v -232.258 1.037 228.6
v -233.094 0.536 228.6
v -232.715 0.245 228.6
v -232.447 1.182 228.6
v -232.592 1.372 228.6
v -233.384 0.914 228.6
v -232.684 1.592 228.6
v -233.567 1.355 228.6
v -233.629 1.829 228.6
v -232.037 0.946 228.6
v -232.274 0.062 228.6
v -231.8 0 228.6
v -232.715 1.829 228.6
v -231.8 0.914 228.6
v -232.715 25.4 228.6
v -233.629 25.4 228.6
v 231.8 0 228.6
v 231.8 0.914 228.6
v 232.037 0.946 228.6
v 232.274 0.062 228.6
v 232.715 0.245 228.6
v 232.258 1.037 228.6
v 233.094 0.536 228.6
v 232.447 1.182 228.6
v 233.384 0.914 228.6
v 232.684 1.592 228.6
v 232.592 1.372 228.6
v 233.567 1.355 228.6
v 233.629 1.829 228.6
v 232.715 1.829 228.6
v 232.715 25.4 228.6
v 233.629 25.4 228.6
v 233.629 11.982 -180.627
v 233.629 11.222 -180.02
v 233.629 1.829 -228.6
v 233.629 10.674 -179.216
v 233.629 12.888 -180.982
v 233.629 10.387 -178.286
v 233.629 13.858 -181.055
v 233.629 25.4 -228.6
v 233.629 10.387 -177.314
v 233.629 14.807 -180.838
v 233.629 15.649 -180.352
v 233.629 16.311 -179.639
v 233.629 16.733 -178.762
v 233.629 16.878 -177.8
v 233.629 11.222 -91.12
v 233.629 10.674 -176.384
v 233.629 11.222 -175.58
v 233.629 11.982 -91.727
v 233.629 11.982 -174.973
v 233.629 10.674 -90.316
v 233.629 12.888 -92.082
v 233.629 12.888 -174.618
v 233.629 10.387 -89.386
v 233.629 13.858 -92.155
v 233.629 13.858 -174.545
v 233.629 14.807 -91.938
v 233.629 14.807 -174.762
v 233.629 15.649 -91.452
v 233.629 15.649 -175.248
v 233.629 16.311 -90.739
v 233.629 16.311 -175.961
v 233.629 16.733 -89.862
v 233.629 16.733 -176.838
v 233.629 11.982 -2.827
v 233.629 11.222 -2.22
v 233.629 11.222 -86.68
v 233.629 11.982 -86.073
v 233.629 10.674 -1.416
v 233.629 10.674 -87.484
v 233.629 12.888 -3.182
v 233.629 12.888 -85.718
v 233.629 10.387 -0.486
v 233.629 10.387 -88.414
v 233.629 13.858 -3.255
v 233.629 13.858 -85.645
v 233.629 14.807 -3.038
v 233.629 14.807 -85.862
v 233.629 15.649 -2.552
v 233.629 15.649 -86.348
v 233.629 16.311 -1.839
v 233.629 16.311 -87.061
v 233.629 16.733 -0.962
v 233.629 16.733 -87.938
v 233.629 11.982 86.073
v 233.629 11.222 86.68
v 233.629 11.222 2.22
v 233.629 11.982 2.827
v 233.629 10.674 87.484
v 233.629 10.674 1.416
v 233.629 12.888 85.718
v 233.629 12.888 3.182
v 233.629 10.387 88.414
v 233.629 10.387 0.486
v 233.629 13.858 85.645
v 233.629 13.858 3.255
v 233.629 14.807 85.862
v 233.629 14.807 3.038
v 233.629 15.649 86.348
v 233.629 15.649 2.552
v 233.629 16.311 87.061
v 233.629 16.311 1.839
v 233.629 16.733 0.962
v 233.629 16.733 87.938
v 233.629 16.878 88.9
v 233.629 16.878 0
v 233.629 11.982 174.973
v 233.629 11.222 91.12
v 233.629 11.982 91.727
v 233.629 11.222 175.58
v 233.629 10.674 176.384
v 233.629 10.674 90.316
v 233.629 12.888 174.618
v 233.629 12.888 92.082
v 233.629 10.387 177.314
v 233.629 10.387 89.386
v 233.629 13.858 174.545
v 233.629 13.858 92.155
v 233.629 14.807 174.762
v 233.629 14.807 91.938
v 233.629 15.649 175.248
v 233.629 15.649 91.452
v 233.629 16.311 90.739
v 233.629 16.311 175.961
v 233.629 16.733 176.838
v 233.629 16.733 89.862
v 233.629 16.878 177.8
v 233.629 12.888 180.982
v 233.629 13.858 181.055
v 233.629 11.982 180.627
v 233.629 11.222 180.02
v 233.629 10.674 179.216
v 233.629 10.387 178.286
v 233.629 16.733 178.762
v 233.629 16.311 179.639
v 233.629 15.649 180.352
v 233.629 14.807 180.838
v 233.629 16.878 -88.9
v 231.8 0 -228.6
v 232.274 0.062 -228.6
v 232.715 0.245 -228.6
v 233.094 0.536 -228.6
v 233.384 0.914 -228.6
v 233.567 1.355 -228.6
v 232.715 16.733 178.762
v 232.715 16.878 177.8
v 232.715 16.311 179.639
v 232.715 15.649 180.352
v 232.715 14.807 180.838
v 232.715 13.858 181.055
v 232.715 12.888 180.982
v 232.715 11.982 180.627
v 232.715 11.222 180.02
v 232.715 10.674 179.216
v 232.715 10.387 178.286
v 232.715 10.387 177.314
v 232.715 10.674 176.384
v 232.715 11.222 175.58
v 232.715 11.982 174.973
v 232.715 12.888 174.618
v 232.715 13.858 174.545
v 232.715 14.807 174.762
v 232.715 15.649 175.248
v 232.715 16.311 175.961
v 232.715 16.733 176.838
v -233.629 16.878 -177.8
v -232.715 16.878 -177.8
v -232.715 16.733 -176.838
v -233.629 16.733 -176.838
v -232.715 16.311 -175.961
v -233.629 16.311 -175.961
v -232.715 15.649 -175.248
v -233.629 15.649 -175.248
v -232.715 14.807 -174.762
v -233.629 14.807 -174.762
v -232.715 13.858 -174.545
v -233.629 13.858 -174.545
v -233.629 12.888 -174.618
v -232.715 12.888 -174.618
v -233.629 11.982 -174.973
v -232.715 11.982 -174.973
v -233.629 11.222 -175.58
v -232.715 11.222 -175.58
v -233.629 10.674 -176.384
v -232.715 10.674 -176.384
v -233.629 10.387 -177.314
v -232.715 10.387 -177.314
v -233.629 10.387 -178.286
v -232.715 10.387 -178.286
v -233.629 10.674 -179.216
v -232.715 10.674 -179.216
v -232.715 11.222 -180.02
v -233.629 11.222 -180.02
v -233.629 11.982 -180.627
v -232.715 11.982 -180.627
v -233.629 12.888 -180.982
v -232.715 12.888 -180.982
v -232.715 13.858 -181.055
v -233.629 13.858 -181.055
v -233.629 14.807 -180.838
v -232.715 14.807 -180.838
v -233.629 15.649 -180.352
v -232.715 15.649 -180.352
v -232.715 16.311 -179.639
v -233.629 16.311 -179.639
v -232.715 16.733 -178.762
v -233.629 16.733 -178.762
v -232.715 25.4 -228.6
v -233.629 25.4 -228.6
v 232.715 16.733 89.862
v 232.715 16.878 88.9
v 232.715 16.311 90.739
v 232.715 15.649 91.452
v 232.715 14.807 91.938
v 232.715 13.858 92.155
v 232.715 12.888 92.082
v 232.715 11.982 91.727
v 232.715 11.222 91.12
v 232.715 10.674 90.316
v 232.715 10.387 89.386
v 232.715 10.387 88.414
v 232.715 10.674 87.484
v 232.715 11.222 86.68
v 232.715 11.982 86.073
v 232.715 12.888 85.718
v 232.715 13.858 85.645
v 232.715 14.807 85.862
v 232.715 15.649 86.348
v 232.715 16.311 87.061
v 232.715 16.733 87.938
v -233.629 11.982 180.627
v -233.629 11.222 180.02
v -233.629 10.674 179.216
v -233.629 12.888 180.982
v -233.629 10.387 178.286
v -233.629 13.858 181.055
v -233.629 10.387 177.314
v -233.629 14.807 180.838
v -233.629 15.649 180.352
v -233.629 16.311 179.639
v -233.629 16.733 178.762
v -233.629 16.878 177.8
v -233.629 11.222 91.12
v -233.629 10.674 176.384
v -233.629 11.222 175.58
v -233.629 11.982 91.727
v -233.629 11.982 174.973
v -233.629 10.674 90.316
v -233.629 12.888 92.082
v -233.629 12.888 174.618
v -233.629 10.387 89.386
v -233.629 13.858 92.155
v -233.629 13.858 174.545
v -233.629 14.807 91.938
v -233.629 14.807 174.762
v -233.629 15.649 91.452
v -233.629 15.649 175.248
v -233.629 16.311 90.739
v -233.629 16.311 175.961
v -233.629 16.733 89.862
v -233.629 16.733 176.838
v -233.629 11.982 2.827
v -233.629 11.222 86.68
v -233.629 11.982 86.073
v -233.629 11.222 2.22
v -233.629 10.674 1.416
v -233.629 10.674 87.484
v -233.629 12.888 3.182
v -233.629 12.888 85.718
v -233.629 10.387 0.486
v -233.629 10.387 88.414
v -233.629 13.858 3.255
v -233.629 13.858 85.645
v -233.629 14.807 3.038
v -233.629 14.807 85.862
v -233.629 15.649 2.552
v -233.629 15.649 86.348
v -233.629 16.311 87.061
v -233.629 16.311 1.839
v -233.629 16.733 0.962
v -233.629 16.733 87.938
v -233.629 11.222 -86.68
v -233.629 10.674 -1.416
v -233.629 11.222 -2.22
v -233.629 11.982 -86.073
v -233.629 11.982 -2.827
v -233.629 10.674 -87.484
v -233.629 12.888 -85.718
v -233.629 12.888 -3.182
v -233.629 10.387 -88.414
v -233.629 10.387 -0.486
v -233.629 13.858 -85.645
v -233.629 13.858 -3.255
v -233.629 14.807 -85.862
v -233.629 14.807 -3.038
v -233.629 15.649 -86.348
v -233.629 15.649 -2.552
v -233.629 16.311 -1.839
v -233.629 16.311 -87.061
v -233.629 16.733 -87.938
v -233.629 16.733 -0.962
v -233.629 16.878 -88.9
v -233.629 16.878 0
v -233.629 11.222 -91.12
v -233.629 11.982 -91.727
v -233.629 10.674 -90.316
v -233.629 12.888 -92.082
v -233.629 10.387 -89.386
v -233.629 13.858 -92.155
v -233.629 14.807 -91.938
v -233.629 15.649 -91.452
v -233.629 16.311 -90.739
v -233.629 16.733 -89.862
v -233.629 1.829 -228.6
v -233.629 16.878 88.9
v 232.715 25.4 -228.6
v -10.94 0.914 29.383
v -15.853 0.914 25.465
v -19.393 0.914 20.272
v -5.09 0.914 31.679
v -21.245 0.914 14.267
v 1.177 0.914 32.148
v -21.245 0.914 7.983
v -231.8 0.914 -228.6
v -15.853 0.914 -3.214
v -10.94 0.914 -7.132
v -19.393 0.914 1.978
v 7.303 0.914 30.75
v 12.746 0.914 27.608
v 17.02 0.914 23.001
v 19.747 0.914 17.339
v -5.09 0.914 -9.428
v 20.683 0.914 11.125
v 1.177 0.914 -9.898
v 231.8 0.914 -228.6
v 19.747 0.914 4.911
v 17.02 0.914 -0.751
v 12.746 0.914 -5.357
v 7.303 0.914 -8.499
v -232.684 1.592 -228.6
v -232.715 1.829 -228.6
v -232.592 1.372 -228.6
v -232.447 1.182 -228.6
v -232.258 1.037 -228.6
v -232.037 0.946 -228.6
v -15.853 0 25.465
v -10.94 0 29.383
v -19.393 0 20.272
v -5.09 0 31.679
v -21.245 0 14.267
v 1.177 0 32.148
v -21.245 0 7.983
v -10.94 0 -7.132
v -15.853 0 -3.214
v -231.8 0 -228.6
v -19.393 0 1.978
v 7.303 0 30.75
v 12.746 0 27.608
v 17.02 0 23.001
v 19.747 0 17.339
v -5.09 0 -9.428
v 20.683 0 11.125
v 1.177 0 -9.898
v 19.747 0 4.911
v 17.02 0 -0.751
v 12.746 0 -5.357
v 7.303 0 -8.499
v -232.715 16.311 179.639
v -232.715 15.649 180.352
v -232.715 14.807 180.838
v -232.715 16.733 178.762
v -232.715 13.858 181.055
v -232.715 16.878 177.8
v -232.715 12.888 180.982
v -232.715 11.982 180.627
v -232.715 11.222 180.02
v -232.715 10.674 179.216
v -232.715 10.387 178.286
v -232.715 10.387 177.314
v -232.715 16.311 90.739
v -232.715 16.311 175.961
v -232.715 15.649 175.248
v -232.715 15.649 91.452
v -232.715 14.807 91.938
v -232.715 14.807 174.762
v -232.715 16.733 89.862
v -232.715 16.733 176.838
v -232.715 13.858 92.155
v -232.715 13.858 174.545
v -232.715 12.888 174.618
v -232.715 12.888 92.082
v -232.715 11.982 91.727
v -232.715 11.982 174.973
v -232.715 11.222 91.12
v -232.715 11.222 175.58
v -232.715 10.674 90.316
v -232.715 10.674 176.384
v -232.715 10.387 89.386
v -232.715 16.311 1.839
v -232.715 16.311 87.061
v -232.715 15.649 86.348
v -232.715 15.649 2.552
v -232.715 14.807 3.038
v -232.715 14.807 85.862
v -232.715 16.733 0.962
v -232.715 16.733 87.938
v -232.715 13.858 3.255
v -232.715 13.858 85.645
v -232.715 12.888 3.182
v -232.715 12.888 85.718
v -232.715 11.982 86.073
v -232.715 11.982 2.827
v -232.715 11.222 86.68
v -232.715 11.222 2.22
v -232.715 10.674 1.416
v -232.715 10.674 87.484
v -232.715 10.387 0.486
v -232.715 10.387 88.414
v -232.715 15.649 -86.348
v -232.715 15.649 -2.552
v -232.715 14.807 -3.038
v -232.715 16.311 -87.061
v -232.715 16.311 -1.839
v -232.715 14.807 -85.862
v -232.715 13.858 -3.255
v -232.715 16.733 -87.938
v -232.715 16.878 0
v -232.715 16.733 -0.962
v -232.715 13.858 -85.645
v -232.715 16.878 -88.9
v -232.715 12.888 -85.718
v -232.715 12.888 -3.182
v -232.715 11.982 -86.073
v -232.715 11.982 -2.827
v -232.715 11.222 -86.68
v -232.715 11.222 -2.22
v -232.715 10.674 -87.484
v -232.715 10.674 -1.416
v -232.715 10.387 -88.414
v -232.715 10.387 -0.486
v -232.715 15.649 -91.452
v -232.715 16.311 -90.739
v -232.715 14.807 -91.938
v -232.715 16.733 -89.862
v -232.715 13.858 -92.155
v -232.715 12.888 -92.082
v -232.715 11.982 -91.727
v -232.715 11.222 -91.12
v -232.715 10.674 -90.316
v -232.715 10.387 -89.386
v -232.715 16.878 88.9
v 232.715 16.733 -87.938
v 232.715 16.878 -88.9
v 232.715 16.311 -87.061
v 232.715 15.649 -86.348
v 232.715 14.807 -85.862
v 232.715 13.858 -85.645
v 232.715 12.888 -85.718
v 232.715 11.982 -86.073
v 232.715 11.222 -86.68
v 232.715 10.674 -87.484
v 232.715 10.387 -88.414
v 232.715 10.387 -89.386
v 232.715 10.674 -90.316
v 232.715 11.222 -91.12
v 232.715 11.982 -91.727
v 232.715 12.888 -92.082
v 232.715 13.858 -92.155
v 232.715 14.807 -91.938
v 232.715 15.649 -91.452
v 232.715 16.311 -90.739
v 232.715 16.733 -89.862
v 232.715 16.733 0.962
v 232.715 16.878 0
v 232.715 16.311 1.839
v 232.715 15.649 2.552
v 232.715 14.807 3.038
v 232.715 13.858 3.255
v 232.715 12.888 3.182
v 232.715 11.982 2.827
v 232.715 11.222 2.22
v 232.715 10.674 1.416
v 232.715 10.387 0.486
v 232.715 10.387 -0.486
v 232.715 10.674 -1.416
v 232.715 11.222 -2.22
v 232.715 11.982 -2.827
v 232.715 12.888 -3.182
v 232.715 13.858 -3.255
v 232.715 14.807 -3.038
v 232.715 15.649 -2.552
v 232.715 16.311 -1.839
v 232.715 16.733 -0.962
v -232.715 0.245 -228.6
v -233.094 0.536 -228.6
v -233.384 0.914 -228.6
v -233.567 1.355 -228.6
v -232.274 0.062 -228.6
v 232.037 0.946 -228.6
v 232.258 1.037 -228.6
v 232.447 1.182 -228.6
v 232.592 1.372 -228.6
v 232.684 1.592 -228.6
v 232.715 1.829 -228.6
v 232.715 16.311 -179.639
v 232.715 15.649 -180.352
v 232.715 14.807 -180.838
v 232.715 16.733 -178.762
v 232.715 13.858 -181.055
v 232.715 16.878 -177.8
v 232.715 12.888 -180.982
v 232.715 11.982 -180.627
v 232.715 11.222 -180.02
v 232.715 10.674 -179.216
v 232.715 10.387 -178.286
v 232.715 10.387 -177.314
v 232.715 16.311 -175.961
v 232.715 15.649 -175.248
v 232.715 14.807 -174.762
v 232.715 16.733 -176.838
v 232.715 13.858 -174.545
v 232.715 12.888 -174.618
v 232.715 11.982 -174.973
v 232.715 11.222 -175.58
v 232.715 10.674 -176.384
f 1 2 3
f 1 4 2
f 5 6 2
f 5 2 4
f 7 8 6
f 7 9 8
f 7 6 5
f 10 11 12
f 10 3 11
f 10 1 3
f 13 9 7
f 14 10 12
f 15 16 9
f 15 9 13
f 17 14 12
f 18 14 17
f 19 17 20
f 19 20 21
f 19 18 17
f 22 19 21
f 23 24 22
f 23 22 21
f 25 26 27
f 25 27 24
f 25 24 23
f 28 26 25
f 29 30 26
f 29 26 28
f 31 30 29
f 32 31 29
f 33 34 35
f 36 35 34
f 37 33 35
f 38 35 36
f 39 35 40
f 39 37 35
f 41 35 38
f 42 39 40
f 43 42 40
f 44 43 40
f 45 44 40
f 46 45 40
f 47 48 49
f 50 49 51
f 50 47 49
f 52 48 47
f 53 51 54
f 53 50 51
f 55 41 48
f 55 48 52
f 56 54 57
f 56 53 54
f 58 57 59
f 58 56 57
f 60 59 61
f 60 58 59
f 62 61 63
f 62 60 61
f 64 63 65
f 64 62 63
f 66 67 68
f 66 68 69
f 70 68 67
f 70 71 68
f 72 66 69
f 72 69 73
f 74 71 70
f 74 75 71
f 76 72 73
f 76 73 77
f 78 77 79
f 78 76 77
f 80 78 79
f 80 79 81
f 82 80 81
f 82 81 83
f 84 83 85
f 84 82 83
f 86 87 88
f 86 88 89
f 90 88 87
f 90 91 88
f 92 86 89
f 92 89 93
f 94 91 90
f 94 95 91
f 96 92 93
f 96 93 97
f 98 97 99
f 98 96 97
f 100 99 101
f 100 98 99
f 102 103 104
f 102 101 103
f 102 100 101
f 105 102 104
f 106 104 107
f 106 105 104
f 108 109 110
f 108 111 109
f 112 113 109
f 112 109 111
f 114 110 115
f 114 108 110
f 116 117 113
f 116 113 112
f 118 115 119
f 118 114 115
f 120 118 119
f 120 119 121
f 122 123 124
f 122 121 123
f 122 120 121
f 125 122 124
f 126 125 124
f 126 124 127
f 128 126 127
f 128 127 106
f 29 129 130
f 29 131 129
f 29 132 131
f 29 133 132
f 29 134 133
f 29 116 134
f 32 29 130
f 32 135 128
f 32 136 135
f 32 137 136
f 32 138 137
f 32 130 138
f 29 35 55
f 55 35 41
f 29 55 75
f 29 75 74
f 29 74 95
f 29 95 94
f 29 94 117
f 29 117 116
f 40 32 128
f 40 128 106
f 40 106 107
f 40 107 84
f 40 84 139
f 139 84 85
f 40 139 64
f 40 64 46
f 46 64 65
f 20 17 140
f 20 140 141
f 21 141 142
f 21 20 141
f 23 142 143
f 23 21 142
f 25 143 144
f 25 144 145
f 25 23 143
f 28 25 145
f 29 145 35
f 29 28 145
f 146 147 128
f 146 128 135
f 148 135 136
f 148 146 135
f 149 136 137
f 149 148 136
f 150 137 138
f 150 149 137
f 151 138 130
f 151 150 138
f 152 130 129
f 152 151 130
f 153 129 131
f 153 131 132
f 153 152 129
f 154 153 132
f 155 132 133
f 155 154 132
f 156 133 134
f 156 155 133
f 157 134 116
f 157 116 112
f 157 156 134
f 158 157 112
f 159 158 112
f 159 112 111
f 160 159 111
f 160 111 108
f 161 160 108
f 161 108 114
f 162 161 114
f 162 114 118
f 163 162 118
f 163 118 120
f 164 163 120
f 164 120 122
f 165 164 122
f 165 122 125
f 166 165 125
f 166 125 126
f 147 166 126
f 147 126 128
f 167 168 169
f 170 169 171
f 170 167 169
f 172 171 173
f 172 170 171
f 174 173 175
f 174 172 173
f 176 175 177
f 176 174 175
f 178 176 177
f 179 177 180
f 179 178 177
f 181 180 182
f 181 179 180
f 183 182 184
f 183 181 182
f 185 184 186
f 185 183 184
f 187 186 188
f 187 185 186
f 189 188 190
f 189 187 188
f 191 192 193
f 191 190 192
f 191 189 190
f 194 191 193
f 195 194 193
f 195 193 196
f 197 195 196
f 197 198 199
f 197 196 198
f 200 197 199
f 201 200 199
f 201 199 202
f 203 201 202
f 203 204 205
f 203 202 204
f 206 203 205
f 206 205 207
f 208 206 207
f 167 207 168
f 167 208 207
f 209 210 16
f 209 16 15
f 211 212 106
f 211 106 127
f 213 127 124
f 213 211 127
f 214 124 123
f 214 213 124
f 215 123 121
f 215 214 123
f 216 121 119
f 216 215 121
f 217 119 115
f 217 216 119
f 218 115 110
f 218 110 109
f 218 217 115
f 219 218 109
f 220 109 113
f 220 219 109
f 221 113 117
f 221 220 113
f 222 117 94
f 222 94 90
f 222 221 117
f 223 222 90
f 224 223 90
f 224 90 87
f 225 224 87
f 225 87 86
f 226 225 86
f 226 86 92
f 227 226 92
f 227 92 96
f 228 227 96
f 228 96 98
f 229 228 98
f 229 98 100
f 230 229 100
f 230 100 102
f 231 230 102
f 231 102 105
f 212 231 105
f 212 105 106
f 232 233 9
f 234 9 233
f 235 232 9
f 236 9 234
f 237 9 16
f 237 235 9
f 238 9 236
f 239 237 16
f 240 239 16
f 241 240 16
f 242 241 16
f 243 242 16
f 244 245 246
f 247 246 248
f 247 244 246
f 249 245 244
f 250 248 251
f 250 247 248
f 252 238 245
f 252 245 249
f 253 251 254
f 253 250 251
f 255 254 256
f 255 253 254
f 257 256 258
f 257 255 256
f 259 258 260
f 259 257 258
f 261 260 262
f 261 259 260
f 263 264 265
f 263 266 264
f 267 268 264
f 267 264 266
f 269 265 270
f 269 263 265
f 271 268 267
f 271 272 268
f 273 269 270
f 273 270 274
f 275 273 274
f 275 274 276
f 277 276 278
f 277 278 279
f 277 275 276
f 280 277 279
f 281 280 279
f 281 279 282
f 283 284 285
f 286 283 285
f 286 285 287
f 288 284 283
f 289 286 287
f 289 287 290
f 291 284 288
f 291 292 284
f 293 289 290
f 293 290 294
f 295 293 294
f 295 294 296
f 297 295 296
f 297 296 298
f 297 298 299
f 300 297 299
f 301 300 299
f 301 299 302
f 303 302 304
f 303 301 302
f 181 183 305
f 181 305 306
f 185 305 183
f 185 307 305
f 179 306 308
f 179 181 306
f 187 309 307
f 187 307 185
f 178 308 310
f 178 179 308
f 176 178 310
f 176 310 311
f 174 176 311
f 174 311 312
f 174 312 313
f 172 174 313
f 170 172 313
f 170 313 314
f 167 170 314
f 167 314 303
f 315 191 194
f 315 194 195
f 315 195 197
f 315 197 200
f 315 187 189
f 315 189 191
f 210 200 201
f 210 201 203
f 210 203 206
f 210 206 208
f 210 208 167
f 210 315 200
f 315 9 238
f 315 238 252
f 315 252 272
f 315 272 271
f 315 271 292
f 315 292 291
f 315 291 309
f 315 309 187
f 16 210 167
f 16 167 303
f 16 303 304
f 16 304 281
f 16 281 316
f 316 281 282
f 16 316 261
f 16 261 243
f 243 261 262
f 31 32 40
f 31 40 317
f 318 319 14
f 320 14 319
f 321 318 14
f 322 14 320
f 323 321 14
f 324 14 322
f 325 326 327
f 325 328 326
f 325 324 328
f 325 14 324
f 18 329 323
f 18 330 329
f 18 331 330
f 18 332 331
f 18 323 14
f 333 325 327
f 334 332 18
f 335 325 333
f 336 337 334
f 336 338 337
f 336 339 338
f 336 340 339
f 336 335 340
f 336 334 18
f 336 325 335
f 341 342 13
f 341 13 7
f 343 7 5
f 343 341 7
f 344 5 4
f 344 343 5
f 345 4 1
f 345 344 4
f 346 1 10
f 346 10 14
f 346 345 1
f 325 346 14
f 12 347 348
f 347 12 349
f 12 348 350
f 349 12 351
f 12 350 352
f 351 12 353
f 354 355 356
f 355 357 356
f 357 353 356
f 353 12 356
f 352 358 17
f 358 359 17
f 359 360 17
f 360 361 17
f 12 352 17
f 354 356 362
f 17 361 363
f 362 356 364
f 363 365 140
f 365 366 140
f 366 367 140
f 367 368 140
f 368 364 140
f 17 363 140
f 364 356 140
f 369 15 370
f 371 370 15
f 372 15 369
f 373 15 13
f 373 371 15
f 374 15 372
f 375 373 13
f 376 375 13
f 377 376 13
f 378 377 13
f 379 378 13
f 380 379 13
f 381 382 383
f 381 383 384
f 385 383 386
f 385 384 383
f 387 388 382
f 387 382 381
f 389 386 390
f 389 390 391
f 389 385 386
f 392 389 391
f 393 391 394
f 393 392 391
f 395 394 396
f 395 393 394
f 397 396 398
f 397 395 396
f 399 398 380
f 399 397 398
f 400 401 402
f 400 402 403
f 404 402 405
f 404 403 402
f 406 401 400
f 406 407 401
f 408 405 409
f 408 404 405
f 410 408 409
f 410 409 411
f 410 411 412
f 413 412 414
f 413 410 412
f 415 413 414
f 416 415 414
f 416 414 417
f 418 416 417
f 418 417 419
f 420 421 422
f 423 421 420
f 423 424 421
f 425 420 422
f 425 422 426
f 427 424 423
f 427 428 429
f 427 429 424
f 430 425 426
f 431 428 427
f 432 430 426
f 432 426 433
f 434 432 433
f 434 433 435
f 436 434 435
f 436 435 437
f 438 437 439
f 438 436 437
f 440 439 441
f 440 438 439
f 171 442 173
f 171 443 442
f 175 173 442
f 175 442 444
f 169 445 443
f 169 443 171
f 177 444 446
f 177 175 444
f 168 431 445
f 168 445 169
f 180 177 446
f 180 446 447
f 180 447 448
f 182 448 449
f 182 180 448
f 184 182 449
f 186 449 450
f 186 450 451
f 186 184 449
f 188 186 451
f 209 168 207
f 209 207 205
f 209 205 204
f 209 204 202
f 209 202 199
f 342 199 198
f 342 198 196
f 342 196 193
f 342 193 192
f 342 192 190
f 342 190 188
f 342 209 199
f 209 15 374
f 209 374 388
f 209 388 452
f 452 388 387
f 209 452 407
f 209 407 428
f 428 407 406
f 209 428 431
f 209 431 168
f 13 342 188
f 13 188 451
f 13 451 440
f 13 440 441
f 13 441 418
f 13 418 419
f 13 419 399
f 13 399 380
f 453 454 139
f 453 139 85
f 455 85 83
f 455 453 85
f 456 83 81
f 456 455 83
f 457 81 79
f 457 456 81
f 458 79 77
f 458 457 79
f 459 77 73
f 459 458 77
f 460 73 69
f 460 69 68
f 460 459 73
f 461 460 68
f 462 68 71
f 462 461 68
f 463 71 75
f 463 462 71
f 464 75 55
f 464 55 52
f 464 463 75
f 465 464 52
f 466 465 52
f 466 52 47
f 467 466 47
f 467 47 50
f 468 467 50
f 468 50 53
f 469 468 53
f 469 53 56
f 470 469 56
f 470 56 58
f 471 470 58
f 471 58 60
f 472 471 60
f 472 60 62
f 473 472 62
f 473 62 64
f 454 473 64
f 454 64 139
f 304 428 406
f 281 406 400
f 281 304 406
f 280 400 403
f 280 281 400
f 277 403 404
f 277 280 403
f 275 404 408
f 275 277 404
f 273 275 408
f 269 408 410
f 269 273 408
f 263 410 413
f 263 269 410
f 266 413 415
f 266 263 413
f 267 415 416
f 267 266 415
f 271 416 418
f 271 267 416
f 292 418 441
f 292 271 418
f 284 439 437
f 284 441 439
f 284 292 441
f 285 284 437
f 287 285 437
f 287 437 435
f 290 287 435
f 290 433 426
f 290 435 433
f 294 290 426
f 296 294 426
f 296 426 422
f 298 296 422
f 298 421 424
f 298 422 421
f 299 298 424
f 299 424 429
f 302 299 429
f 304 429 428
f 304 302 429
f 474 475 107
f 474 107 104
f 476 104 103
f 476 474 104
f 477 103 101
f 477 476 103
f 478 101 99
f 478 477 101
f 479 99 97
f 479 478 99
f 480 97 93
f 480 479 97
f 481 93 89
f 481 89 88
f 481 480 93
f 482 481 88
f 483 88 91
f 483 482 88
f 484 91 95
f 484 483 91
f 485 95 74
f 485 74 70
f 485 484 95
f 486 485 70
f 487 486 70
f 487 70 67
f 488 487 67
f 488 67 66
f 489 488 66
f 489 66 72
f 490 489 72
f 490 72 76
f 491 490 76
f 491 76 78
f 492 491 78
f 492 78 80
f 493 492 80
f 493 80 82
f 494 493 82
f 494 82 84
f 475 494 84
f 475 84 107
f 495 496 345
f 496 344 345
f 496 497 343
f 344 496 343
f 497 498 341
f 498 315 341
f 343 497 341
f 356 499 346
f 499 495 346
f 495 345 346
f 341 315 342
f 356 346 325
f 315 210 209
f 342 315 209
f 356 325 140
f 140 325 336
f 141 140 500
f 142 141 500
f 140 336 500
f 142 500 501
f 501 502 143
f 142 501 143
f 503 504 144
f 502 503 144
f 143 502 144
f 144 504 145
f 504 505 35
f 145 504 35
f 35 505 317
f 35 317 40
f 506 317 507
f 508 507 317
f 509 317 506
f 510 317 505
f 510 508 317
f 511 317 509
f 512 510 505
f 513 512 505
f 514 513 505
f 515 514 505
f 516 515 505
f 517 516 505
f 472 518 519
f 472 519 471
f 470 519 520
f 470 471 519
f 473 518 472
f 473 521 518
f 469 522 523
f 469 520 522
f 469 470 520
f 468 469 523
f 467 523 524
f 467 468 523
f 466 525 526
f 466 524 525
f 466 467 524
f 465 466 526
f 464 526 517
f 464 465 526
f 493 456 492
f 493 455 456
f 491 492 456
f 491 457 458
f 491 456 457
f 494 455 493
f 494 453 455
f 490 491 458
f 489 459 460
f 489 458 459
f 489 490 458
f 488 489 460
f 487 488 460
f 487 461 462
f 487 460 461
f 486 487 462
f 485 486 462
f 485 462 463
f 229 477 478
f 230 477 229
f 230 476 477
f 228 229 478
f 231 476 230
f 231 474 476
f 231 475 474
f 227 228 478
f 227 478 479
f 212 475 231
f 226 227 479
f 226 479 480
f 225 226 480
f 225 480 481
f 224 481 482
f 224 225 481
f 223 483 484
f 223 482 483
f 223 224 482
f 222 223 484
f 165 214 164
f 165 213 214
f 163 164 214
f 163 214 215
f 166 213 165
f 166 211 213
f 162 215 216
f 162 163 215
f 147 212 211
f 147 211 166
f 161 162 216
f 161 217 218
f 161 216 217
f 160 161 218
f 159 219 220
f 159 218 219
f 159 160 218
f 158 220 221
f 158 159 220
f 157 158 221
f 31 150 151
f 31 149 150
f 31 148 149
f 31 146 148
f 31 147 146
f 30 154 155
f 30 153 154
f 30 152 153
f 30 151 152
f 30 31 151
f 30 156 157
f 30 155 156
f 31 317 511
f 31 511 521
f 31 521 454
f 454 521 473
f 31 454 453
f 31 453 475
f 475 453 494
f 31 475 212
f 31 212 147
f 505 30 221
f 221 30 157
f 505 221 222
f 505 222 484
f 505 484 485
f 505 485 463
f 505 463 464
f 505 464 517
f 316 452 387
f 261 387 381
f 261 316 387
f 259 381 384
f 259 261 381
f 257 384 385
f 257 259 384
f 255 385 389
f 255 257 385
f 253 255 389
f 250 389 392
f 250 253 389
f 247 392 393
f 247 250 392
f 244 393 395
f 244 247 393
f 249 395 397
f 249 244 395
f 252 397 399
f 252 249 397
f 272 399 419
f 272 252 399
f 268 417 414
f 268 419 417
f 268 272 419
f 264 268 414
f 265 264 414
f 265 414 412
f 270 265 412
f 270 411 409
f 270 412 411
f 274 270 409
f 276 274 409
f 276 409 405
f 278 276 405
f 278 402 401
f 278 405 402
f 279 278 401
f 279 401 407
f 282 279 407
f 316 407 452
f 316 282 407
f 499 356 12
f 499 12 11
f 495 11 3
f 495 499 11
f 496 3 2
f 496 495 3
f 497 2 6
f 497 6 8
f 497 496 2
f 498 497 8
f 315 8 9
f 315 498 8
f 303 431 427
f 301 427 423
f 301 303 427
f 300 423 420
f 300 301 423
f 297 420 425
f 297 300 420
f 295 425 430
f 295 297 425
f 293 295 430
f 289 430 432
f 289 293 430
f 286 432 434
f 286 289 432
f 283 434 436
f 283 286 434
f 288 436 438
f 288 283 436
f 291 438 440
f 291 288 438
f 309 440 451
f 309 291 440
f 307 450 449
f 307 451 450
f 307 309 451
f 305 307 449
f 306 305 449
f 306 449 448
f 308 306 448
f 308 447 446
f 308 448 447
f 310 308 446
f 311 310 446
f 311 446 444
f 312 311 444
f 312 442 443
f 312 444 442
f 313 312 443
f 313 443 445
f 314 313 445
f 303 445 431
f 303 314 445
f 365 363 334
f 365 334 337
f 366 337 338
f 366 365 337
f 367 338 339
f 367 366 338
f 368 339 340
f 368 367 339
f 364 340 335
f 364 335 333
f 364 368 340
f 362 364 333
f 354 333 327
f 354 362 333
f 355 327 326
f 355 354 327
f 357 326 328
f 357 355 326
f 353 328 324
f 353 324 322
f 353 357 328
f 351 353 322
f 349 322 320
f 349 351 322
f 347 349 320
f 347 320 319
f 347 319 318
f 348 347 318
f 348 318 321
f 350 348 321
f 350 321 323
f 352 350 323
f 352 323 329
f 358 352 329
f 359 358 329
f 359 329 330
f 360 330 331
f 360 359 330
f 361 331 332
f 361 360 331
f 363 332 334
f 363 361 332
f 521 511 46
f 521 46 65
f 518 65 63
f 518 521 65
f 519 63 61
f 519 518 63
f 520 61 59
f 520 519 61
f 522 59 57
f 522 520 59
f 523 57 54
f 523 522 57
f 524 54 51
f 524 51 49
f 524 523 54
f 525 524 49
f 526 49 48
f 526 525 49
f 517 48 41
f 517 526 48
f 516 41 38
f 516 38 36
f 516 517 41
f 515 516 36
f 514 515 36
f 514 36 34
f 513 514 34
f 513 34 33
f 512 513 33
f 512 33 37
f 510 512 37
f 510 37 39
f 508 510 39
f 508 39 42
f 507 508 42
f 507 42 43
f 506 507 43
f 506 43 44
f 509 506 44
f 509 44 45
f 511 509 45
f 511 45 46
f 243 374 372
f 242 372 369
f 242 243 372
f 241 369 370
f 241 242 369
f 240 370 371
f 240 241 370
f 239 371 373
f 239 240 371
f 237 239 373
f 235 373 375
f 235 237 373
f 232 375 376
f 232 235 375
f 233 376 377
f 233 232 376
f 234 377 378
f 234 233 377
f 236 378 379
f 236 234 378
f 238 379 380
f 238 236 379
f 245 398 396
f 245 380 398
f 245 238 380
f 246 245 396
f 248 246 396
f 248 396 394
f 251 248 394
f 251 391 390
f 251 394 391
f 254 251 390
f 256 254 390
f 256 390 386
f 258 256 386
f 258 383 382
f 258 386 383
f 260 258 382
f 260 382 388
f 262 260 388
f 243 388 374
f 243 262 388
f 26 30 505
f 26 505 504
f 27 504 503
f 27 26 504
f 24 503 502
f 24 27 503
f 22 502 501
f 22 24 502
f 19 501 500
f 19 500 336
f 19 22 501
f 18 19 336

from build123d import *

# Parameters (mm, degrees)
SKETCH1_W                    = 465.4296
SKETCH1_H                    = 457.2
BOSS_EXTRUDE1_DEPTH          = 0.9144
EDGE_FLANGE1_STRIP_W         = 5.4864
EDGE_FLANGE1_STRIP_H         = 0.9144
EDGE_FLANGE1_STRIP_CUT_DEPTH = 457.2
EDGE_FLANGE1_DEPTH           = 457.2
EDGE_FLANGE2_STRIP_W         = 5.4864
EDGE_FLANGE2_STRIP_H         = 0.9144
EDGE_FLANGE2_STRIP_CUT_DEPTH = 457.2
EDGE_FLANGE2_DEPTH           = 457.2
CUT_EXTRUDE1_START           = -233.6292
CUT_EXTRUDE1_OUTLINE_R       = 3.2639
CUT_EXTRUDE1_DEPTH           = 467.2584
CUT_EXTRUDE1_START_2         = -0.9144
CUT_EXTRUDE1_2_OUTLINE_R     = 21.082
CUT_EXTRUDE1_2_DEPTH         = 0.9144


# Read off the part's stored shape, not the designer's step: Cut-Extrude1
# Sheet-metal steps are written as plain solids
with BuildPart() as part:
    # Sketch1 → Boss-Extrude1 (new body)
    with BuildSketch(Plane(origin=(0, 0, 0), x_dir=(1, 0, 0), z_dir=(0, 1, 0))):
        Rectangle(SKETCH1_W, SKETCH1_H)
    extrude(amount=BOSS_EXTRUDE1_DEPTH)

    # Edge-Flange1 strip (across the edge) → Edge-Flange1 strip cut (cut)
    with BuildSketch(Plane(origin=(-232.7148, 0.9144, -228.6), x_dir=(1, 0, 0), z_dir=(0, 0, 1))):
        with Locations((-1.8288, -0.4572)):
            Rectangle(EDGE_FLANGE1_STRIP_W, EDGE_FLANGE1_STRIP_H)
    extrude(amount=EDGE_FLANGE1_STRIP_CUT_DEPTH, mode=Mode.SUBTRACT)

    # Edge-Flange1 section (across the edge) → Edge-Flange1 (add)
    with BuildSketch(Plane(origin=(-232.7148, 0.9144, -228.6), x_dir=(1, 0, 0), z_dir=(0, 0, 1))):
        with BuildLine():
            Line((-0.9144, 0.9144), (-0.9144, 24.4856))
            Line((-0.9144, 24.4856), (0, 24.4856))
            Line((0, 24.4856), (0, 0.9144))
            ThreePointArc((0, 0.9144), (0.267821559, 0.267821559), (0.9144, 0))
            Line((0.9144, 0), (0.9144, -0.9144))
            ThreePointArc((0.9144, -0.9144), (-0.378756881, -0.378756881), (-0.9144, 0.9144))
        make_face()
    extrude(amount=EDGE_FLANGE1_DEPTH)

    # Edge-Flange2 strip (across the edge) → Edge-Flange2 strip cut (cut)
    with BuildSketch(Plane(origin=(232.7148, 0.9144, 228.6), x_dir=(-1, 0, 0), z_dir=(0, 0, -1))):
        with Locations((-1.8288, -0.4572)):
            Rectangle(EDGE_FLANGE2_STRIP_W, EDGE_FLANGE2_STRIP_H)
    extrude(amount=EDGE_FLANGE2_STRIP_CUT_DEPTH, mode=Mode.SUBTRACT)

    # Edge-Flange2 section (across the edge) → Edge-Flange2 (add)
    with BuildSketch(Plane(origin=(232.7148, 0.9144, 228.6), x_dir=(-1, 0, 0), z_dir=(0, 0, -1))):
        with BuildLine():
            Line((-0.9144, 0.9144), (-0.9144, 24.4856))
            Line((-0.9144, 24.4856), (0, 24.4856))
            Line((0, 24.4856), (0, 0.9144))
            ThreePointArc((0, 0.9144), (0.267821559, 0.267821559), (0.9144, 0))
            Line((0.9144, 0), (0.9144, -0.9144))
            ThreePointArc((0.9144, -0.9144), (-0.378756881, -0.378756881), (-0.9144, 0.9144))
        make_face()
    extrude(amount=EDGE_FLANGE2_DEPTH)

    # Cut-Extrude1 outline → Cut-Extrude1 (cut)
    with BuildSketch(Plane.YZ.offset(CUT_EXTRUDE1_START)):
        with Locations((13.6144, -177.8)):
            Circle(CUT_EXTRUDE1_OUTLINE_R)
        with Locations((13.6144, -88.9)):
            Circle(CUT_EXTRUDE1_OUTLINE_R)
        with Locations((13.6144, 0)):
            Circle(CUT_EXTRUDE1_OUTLINE_R)
        with Locations((13.6144, 88.9)):
            Circle(CUT_EXTRUDE1_OUTLINE_R)
        with Locations((13.6144, 177.8)):
            Circle(CUT_EXTRUDE1_OUTLINE_R)
    extrude(amount=CUT_EXTRUDE1_DEPTH, mode=Mode.SUBTRACT)

    # Cut-Extrude1 2 outline → Cut-Extrude1 2 (cut)
    with BuildSketch(Plane(origin=(0, 0.9144, 0), x_dir=(1, 0, 0), z_dir=(0, 1, 0)).offset(CUT_EXTRUDE1_START_2)):
        with Locations((-0.39878, -11.1252)):
            Circle(CUT_EXTRUDE1_2_OUTLINE_R)
    extrude(amount=CUT_EXTRUDE1_2_DEPTH, mode=Mode.SUBTRACT)


solid = part.part
